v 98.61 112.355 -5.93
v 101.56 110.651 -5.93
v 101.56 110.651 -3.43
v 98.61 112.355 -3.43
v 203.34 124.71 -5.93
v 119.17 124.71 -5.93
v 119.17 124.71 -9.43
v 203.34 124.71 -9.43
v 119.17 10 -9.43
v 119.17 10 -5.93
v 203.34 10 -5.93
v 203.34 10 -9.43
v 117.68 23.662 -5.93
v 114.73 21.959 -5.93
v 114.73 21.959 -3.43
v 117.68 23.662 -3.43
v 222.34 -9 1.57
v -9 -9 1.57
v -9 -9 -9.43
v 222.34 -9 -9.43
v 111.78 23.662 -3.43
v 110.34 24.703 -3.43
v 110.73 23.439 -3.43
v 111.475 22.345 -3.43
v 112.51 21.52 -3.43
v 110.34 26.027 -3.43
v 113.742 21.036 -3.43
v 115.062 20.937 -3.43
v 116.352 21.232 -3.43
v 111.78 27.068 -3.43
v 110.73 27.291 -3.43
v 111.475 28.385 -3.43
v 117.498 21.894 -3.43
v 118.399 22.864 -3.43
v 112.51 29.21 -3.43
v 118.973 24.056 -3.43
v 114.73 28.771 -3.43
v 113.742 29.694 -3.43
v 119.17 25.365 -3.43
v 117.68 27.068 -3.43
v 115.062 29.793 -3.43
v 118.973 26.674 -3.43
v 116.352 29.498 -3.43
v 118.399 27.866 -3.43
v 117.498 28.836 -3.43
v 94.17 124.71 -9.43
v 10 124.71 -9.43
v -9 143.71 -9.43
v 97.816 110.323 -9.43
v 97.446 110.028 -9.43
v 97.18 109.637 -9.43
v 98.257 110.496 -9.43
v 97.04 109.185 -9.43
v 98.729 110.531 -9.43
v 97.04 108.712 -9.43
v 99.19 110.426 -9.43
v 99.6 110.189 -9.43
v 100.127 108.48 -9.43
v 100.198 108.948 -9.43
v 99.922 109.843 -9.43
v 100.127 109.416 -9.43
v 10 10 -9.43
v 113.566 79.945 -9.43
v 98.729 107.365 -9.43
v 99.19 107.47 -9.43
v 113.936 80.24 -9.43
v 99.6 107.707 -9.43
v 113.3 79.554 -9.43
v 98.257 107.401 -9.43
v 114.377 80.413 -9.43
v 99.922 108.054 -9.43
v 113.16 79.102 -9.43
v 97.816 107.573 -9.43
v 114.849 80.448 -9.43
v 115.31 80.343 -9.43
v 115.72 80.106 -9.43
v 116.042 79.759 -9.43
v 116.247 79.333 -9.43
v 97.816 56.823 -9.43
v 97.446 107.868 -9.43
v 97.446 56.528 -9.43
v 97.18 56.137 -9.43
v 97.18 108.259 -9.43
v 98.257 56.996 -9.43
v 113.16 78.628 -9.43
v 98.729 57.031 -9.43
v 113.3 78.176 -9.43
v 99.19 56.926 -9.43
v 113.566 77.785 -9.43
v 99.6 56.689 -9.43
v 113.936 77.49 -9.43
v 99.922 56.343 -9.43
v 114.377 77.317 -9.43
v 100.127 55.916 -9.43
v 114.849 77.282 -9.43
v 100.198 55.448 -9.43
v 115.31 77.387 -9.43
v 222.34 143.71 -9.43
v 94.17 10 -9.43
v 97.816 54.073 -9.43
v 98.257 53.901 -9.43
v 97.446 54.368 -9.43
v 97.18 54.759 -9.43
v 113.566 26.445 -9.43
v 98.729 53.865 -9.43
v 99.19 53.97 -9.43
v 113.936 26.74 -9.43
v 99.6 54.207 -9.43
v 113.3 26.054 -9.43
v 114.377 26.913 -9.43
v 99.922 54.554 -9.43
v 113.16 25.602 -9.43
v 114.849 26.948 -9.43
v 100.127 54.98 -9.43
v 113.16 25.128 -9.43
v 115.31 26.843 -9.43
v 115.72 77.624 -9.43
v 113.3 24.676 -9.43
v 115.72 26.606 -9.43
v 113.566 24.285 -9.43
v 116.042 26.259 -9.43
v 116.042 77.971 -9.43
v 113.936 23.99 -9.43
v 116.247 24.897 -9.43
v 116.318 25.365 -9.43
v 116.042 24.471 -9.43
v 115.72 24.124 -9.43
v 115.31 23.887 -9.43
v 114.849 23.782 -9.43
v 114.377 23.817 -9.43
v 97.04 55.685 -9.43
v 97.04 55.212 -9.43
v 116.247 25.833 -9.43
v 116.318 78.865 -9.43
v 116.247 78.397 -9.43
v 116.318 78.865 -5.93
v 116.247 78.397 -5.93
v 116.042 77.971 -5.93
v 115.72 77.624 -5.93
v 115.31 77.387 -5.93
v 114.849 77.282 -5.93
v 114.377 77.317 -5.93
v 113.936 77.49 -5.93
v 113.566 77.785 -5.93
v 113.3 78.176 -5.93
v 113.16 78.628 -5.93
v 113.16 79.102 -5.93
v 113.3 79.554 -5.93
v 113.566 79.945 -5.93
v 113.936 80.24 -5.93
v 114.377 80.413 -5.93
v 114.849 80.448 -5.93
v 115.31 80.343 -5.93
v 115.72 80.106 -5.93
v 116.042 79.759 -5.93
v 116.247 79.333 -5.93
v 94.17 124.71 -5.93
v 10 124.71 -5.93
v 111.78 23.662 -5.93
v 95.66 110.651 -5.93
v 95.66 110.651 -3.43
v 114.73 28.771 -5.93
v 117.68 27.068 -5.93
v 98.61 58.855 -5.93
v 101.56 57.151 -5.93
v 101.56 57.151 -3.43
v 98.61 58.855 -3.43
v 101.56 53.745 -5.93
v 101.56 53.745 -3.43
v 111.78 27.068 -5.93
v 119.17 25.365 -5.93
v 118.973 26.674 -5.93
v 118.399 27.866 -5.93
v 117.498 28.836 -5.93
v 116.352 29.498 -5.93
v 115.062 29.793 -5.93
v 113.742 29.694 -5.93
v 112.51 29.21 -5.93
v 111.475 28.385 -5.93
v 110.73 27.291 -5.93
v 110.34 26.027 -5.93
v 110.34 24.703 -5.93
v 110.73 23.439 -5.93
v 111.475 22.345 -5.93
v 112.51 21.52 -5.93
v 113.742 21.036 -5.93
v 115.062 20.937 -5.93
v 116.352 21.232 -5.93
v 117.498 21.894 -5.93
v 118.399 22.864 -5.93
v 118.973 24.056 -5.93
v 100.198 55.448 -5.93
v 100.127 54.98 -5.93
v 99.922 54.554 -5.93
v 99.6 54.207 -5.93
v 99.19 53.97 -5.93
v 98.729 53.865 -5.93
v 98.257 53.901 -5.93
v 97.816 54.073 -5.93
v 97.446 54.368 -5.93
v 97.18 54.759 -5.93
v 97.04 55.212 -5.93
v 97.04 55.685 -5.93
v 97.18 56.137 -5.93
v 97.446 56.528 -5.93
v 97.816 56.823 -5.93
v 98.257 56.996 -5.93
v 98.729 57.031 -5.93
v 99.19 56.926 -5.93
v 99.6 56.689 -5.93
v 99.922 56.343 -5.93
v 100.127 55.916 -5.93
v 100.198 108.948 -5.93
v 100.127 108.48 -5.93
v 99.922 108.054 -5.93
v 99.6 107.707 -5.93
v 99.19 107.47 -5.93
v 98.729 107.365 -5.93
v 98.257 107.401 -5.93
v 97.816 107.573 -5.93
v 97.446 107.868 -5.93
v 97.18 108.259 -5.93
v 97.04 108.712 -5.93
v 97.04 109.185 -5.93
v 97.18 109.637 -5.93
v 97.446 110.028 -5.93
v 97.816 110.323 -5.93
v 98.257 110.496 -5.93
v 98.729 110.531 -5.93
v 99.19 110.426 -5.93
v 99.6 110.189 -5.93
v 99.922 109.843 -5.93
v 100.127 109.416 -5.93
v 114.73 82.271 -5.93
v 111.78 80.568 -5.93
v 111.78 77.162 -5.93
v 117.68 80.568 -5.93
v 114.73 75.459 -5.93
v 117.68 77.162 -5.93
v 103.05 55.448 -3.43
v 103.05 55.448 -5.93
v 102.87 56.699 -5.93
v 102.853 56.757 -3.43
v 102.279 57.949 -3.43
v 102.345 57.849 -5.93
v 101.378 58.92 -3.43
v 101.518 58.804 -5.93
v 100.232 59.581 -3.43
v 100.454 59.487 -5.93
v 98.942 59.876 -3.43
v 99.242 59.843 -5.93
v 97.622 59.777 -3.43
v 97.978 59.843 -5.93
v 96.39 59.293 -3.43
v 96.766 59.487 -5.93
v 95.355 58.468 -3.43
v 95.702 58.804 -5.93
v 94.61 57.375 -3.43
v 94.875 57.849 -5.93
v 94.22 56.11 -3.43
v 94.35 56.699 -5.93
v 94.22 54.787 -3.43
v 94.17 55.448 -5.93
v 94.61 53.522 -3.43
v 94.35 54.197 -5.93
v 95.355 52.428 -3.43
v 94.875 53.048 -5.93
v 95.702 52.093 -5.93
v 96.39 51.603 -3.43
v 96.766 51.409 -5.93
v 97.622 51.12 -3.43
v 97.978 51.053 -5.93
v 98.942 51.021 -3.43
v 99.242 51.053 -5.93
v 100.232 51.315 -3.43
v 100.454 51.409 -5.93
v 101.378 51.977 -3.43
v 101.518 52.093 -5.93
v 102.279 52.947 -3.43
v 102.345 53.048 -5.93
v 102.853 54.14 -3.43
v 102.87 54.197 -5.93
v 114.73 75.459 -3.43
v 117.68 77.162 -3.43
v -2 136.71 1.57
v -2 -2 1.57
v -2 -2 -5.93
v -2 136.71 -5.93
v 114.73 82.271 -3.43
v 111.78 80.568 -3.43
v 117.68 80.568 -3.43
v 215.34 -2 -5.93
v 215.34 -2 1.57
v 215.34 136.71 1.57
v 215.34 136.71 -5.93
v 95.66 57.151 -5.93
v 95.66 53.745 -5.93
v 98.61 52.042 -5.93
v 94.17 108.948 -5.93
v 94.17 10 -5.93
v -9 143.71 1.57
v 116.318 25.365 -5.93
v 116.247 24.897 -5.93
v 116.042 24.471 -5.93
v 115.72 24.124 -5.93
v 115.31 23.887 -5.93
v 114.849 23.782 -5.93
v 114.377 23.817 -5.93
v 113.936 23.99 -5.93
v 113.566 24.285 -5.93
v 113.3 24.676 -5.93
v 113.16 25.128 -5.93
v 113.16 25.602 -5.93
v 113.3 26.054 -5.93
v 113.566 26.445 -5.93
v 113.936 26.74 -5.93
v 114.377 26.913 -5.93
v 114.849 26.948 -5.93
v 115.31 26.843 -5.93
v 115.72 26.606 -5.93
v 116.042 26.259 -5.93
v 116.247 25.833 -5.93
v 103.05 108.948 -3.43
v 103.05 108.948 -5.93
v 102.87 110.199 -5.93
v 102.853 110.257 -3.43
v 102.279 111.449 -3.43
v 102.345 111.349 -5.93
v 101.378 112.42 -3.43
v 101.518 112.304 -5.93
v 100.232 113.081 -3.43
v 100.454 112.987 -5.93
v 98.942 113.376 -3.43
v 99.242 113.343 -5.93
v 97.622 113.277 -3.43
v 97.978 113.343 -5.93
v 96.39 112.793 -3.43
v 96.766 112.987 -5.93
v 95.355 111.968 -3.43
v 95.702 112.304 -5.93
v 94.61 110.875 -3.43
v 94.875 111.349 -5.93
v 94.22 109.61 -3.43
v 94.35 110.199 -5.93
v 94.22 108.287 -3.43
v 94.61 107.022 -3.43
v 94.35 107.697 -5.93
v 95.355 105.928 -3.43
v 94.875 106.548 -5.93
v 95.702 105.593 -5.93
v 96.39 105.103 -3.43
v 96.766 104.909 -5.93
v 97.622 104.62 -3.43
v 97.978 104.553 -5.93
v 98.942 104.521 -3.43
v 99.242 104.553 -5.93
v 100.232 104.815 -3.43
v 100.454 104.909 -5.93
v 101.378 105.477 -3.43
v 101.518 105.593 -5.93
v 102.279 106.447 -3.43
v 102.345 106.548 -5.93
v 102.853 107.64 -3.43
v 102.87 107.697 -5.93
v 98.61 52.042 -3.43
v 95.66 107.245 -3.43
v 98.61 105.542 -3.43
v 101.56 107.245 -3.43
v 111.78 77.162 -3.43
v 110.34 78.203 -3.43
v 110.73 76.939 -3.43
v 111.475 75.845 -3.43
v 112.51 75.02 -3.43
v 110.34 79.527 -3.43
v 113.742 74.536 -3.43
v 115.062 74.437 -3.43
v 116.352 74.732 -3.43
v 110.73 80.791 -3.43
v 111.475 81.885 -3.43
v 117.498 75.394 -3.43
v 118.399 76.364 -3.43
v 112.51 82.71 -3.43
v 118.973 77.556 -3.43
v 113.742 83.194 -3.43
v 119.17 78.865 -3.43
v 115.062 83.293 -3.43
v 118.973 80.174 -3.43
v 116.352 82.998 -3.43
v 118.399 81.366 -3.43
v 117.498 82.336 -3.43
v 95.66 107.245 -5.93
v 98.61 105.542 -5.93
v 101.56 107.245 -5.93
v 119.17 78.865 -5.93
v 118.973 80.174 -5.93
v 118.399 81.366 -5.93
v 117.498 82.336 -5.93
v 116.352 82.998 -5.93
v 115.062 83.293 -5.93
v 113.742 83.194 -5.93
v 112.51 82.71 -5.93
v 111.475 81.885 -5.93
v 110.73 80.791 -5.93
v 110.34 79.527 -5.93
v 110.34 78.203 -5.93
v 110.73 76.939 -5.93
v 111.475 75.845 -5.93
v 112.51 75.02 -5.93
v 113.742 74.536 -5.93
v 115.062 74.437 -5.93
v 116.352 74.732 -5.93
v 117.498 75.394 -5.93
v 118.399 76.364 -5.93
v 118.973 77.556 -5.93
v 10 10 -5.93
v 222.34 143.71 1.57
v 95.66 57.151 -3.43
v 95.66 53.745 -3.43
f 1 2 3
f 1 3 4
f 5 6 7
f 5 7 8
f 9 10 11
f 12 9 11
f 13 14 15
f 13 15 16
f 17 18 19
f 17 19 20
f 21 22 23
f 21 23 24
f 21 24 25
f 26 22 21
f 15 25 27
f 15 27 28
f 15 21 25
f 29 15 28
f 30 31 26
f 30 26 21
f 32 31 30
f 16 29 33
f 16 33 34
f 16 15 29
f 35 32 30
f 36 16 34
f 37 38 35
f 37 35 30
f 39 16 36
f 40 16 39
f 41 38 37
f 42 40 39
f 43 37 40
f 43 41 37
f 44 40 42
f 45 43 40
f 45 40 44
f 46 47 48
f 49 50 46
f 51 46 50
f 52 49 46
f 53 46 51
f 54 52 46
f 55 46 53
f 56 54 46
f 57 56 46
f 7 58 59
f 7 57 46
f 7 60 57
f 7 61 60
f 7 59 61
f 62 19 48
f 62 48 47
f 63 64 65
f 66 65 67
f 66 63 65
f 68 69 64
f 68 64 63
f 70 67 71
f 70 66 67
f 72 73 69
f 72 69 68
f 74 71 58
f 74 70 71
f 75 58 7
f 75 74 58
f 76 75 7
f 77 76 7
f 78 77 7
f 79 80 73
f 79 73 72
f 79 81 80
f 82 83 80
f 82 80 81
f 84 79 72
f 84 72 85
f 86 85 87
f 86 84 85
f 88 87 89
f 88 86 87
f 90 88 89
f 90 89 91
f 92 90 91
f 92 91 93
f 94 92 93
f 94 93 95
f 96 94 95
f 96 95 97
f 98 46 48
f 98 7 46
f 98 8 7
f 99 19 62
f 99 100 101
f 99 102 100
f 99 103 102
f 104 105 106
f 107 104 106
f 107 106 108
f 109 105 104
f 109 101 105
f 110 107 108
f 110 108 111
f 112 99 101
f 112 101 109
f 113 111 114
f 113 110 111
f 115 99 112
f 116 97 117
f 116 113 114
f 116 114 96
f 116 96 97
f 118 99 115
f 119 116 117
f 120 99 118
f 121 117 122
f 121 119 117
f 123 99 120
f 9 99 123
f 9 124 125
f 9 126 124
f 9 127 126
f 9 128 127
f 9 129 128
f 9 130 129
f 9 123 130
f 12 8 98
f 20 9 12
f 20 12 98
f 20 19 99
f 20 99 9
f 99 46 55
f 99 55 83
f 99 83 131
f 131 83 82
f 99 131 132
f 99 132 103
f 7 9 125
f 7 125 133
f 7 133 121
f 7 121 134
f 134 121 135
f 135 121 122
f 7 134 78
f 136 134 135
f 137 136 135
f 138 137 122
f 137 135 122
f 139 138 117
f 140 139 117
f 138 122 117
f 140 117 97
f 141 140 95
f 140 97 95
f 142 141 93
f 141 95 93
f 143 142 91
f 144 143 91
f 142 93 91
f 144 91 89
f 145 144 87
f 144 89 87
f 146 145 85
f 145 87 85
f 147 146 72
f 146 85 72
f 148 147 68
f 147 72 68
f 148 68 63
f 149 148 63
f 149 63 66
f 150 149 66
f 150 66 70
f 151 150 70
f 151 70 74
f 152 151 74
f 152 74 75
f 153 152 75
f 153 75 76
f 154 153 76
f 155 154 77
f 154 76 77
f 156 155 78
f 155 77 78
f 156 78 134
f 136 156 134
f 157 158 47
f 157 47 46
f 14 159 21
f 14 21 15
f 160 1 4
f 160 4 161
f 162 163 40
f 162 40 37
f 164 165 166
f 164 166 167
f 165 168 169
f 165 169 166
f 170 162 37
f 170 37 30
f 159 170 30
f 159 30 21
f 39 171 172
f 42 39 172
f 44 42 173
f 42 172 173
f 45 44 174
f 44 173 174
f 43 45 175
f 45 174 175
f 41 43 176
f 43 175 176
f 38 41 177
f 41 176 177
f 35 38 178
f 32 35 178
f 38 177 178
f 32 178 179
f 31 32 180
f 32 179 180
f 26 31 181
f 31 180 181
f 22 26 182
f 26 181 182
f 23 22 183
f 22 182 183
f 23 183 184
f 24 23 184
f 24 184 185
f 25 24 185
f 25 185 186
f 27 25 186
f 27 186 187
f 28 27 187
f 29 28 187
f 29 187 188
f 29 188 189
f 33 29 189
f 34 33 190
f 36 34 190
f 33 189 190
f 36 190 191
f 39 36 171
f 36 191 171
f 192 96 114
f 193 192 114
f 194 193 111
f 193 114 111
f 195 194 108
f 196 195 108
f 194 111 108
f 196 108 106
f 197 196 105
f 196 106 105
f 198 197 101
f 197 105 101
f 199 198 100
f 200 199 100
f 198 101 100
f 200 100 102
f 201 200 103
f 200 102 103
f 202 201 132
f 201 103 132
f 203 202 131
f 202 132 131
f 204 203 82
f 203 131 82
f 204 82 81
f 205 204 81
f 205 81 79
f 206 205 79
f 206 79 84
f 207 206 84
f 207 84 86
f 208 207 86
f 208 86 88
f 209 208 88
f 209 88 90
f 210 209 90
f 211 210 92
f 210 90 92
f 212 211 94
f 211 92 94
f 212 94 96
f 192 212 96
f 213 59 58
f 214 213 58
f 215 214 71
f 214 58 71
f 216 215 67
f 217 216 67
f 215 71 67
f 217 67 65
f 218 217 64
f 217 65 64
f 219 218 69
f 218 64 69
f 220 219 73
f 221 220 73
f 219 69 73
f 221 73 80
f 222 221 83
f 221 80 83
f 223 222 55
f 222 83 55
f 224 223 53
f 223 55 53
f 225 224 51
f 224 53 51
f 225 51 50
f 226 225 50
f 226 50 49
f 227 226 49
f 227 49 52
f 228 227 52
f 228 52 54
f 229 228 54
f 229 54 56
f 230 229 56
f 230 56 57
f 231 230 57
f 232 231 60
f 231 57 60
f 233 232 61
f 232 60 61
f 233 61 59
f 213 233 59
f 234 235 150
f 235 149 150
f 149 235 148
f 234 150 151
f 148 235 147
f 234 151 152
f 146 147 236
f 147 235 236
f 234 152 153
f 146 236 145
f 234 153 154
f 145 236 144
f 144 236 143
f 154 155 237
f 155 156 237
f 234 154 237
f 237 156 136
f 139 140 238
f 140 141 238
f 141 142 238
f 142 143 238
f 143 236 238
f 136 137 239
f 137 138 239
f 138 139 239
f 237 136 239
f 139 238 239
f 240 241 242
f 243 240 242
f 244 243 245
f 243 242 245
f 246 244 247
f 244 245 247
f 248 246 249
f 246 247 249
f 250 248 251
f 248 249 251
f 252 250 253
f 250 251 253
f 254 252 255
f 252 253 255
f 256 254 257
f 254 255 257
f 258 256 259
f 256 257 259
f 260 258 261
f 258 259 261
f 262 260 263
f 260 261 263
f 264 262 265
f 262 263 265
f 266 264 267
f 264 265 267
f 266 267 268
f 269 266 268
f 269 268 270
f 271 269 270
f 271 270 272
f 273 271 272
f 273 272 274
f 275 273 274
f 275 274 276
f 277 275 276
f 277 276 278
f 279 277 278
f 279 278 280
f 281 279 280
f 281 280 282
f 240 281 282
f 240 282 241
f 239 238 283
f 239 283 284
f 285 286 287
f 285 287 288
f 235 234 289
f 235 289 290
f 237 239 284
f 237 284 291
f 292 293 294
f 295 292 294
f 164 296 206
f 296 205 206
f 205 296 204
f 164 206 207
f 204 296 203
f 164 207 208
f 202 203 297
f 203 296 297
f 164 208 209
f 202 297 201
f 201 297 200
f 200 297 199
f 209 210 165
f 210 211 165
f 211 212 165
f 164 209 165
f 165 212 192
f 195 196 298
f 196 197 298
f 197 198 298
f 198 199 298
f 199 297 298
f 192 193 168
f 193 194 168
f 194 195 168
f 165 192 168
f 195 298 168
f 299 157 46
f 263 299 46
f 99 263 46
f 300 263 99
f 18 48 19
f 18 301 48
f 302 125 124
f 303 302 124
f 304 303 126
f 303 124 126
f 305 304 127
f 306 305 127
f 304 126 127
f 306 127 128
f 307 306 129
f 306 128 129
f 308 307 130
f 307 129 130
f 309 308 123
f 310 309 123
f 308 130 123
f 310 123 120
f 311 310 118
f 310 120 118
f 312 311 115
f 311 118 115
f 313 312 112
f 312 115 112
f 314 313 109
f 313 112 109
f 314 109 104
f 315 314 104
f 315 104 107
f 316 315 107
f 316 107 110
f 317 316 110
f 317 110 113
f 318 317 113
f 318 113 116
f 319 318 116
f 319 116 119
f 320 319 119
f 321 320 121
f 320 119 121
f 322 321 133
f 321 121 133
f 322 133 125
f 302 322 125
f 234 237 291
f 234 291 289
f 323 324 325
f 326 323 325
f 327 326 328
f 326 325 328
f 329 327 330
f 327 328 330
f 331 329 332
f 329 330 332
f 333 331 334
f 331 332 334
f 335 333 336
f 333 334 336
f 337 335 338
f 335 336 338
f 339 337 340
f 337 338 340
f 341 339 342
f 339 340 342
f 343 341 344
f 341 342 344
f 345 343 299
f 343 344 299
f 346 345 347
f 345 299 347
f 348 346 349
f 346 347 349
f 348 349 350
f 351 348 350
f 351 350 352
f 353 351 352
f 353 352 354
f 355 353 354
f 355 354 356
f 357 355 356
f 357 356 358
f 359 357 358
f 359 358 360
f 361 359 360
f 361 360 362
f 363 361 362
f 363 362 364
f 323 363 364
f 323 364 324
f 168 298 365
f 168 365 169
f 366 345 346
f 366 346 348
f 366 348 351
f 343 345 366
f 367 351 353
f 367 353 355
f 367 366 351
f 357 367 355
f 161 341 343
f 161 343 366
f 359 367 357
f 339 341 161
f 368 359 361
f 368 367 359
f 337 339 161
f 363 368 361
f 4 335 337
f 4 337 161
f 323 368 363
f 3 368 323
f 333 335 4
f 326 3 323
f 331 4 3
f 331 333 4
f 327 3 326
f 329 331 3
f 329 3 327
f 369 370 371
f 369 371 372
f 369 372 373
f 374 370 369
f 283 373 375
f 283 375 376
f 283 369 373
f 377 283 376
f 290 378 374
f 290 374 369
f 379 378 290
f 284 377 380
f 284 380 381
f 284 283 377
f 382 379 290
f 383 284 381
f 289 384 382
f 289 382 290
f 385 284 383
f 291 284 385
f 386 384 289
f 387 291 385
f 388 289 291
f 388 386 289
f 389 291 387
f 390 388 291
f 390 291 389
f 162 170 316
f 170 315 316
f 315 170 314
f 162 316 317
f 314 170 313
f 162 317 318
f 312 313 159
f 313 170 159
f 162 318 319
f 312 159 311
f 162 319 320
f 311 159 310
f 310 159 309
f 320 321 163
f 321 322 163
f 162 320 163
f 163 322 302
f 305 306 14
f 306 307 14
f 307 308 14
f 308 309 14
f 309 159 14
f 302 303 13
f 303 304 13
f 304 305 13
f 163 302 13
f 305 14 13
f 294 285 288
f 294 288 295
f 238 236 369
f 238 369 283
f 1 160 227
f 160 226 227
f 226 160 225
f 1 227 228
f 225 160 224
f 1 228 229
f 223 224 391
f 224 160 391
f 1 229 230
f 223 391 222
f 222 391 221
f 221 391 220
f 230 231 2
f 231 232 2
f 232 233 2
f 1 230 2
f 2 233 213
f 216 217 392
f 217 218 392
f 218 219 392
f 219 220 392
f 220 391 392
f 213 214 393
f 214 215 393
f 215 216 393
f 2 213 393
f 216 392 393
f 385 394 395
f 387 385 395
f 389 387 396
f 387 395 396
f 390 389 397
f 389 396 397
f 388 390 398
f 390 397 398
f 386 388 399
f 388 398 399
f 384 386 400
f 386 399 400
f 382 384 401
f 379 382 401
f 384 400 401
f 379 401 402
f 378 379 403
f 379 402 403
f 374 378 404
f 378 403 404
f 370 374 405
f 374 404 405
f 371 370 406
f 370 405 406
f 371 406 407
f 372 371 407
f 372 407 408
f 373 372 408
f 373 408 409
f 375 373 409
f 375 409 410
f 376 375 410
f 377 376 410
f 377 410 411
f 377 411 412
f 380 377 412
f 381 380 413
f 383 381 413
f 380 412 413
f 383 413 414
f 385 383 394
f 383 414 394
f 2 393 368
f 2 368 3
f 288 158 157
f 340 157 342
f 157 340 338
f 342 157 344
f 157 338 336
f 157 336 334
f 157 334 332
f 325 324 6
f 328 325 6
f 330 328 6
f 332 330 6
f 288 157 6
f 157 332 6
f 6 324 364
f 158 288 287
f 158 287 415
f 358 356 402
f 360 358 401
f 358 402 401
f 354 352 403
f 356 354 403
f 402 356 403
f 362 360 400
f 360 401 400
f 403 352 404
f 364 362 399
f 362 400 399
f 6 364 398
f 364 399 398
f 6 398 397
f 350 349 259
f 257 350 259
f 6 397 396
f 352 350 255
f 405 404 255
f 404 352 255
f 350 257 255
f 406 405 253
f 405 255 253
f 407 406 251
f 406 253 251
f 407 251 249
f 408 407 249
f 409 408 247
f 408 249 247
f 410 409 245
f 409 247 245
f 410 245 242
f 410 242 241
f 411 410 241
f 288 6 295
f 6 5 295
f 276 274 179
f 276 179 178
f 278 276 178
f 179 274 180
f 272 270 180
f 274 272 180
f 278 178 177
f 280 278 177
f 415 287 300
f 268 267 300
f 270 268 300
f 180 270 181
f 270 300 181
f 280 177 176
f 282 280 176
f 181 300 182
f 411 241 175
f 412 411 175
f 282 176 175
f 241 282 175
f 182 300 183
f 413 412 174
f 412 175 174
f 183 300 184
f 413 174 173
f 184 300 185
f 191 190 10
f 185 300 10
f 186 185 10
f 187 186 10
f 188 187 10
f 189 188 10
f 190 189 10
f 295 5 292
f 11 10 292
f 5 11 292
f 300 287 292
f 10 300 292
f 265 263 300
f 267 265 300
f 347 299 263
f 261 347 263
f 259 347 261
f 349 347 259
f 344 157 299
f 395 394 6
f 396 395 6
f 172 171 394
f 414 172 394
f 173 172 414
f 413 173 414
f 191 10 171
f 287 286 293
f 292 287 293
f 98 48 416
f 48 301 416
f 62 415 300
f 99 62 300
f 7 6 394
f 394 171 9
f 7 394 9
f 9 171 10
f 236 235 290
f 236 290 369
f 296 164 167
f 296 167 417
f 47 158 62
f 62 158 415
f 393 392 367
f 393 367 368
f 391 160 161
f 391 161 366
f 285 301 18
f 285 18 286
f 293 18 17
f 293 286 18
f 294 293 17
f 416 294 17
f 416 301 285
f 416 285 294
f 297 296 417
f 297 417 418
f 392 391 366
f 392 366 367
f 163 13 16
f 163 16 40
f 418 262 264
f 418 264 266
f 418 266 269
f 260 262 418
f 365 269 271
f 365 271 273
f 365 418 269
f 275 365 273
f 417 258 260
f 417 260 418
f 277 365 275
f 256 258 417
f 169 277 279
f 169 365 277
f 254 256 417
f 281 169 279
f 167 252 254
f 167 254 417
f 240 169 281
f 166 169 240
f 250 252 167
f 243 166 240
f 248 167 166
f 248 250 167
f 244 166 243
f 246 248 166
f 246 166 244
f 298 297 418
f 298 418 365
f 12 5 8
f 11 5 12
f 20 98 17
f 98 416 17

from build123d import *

# Parameters (mm, degrees)
SKETCH017_W     = 231.34
SKETCH017_H     = 152.71
SKETCH017_W_2   = 217.34
SKETCH017_H_2   = 138.71
PAD009_DEPTH    = 7.5
SKETCH018_W     = 231.34
SKETCH018_H     = 152.71
SKETCH018_W_2   = 84.17
SKETCH018_H_2   = 114.71
PAD010_DEPTH    = 3.5
SKETCH052_R     = 1.5875
POCKET020_DEPTH = 3.5
SKETCH053_R     = 4.44
PAD027_DEPTH    = 2.5


with BuildPart() as part:
    # Sketch017 → Pad009 (new body)
    with BuildSketch(Plane.XY.offset(1.57)):
        with Locations((106.67, 67.355)):
            Rectangle(SKETCH017_W, SKETCH017_H)
        with Locations((106.67, 67.355)):
            Rectangle(SKETCH017_W_2, SKETCH017_H_2, mode=Mode.SUBTRACT)
    extrude(amount=-PAD009_DEPTH)

    # Sketch018 (on Face10 of Pad009) → Pad010 (join)
    with BuildSketch(Plane(origin=(0, 0, -5.93), x_dir=(1, 0, 0), z_dir=(0, 0, -1))):
        with Locations((106.67, -67.355)):
            Rectangle(SKETCH018_W, SKETCH018_H)
        with Locations((52.085, -67.355)):
            Rectangle(SKETCH018_W_2, SKETCH018_H_2, mode=Mode.SUBTRACT)
        with Locations((161.255, -67.355)):
            Rectangle(SKETCH018_W_2, SKETCH018_H_2, mode=Mode.SUBTRACT)
    extrude(amount=PAD010_DEPTH)

    # Sketch052 (on Face13 of Pad010) → Pocket020 (cut)
    with BuildSketch(Plane(origin=(0, 0, -9.43), x_dir=(1, 0, 0), z_dir=(0, 0, -1))):
        with Locations((114.73, -25.365)):
            Circle(SKETCH052_R)
        with Locations((98.61, -55.448259)):
            Circle(SKETCH052_R)
        with Locations((114.73, -78.865)):
            Circle(SKETCH052_R)
        with Locations((98.61, -108.948259)):
            Circle(SKETCH052_R)
    extrude(amount=-POCKET020_DEPTH, mode=Mode.SUBTRACT)

    # Sketch053 (on Face15 of Pocket020) → Pad027 (join)
    with BuildSketch(Plane.XY.offset(-5.93)):
        with Locations((98.61, 108.948259)):
            Circle(SKETCH053_R)
        Polygon((101.56, 107.245076), (101.56, 110.651443), (98.61, 112.354626), (95.66, 110.651443), (95.66, 107.245076), (98.61, 105.541893), align=None, mode=Mode.SUBTRACT)
        with Locations((114.73, 78.865)):
            Circle(SKETCH053_R)
        Polygon((117.68, 77.161817), (117.68, 80.568183), (114.73, 82.271367), (111.78, 80.568183), (111.78, 77.161817), (114.73, 75.458633), align=None, mode=Mode.SUBTRACT)
        with Locations((98.61, 55.448259)):
            Circle(SKETCH053_R)
        Polygon((101.56, 53.745076), (101.56, 57.151443), (98.61, 58.854626), (95.66, 57.151443), (95.66, 53.745076), (98.61, 52.041893), align=None, mode=Mode.SUBTRACT)
        with Locations((114.73, 25.365)):
            Circle(SKETCH053_R)
        Polygon((117.68, 23.661817), (117.68, 27.068183), (114.73, 28.771367), (111.78, 27.068183), (111.78, 23.661817), (114.73, 21.958633), align=None, mode=Mode.SUBTRACT)
    extrude(amount=PAD027_DEPTH)


solid = part.part
